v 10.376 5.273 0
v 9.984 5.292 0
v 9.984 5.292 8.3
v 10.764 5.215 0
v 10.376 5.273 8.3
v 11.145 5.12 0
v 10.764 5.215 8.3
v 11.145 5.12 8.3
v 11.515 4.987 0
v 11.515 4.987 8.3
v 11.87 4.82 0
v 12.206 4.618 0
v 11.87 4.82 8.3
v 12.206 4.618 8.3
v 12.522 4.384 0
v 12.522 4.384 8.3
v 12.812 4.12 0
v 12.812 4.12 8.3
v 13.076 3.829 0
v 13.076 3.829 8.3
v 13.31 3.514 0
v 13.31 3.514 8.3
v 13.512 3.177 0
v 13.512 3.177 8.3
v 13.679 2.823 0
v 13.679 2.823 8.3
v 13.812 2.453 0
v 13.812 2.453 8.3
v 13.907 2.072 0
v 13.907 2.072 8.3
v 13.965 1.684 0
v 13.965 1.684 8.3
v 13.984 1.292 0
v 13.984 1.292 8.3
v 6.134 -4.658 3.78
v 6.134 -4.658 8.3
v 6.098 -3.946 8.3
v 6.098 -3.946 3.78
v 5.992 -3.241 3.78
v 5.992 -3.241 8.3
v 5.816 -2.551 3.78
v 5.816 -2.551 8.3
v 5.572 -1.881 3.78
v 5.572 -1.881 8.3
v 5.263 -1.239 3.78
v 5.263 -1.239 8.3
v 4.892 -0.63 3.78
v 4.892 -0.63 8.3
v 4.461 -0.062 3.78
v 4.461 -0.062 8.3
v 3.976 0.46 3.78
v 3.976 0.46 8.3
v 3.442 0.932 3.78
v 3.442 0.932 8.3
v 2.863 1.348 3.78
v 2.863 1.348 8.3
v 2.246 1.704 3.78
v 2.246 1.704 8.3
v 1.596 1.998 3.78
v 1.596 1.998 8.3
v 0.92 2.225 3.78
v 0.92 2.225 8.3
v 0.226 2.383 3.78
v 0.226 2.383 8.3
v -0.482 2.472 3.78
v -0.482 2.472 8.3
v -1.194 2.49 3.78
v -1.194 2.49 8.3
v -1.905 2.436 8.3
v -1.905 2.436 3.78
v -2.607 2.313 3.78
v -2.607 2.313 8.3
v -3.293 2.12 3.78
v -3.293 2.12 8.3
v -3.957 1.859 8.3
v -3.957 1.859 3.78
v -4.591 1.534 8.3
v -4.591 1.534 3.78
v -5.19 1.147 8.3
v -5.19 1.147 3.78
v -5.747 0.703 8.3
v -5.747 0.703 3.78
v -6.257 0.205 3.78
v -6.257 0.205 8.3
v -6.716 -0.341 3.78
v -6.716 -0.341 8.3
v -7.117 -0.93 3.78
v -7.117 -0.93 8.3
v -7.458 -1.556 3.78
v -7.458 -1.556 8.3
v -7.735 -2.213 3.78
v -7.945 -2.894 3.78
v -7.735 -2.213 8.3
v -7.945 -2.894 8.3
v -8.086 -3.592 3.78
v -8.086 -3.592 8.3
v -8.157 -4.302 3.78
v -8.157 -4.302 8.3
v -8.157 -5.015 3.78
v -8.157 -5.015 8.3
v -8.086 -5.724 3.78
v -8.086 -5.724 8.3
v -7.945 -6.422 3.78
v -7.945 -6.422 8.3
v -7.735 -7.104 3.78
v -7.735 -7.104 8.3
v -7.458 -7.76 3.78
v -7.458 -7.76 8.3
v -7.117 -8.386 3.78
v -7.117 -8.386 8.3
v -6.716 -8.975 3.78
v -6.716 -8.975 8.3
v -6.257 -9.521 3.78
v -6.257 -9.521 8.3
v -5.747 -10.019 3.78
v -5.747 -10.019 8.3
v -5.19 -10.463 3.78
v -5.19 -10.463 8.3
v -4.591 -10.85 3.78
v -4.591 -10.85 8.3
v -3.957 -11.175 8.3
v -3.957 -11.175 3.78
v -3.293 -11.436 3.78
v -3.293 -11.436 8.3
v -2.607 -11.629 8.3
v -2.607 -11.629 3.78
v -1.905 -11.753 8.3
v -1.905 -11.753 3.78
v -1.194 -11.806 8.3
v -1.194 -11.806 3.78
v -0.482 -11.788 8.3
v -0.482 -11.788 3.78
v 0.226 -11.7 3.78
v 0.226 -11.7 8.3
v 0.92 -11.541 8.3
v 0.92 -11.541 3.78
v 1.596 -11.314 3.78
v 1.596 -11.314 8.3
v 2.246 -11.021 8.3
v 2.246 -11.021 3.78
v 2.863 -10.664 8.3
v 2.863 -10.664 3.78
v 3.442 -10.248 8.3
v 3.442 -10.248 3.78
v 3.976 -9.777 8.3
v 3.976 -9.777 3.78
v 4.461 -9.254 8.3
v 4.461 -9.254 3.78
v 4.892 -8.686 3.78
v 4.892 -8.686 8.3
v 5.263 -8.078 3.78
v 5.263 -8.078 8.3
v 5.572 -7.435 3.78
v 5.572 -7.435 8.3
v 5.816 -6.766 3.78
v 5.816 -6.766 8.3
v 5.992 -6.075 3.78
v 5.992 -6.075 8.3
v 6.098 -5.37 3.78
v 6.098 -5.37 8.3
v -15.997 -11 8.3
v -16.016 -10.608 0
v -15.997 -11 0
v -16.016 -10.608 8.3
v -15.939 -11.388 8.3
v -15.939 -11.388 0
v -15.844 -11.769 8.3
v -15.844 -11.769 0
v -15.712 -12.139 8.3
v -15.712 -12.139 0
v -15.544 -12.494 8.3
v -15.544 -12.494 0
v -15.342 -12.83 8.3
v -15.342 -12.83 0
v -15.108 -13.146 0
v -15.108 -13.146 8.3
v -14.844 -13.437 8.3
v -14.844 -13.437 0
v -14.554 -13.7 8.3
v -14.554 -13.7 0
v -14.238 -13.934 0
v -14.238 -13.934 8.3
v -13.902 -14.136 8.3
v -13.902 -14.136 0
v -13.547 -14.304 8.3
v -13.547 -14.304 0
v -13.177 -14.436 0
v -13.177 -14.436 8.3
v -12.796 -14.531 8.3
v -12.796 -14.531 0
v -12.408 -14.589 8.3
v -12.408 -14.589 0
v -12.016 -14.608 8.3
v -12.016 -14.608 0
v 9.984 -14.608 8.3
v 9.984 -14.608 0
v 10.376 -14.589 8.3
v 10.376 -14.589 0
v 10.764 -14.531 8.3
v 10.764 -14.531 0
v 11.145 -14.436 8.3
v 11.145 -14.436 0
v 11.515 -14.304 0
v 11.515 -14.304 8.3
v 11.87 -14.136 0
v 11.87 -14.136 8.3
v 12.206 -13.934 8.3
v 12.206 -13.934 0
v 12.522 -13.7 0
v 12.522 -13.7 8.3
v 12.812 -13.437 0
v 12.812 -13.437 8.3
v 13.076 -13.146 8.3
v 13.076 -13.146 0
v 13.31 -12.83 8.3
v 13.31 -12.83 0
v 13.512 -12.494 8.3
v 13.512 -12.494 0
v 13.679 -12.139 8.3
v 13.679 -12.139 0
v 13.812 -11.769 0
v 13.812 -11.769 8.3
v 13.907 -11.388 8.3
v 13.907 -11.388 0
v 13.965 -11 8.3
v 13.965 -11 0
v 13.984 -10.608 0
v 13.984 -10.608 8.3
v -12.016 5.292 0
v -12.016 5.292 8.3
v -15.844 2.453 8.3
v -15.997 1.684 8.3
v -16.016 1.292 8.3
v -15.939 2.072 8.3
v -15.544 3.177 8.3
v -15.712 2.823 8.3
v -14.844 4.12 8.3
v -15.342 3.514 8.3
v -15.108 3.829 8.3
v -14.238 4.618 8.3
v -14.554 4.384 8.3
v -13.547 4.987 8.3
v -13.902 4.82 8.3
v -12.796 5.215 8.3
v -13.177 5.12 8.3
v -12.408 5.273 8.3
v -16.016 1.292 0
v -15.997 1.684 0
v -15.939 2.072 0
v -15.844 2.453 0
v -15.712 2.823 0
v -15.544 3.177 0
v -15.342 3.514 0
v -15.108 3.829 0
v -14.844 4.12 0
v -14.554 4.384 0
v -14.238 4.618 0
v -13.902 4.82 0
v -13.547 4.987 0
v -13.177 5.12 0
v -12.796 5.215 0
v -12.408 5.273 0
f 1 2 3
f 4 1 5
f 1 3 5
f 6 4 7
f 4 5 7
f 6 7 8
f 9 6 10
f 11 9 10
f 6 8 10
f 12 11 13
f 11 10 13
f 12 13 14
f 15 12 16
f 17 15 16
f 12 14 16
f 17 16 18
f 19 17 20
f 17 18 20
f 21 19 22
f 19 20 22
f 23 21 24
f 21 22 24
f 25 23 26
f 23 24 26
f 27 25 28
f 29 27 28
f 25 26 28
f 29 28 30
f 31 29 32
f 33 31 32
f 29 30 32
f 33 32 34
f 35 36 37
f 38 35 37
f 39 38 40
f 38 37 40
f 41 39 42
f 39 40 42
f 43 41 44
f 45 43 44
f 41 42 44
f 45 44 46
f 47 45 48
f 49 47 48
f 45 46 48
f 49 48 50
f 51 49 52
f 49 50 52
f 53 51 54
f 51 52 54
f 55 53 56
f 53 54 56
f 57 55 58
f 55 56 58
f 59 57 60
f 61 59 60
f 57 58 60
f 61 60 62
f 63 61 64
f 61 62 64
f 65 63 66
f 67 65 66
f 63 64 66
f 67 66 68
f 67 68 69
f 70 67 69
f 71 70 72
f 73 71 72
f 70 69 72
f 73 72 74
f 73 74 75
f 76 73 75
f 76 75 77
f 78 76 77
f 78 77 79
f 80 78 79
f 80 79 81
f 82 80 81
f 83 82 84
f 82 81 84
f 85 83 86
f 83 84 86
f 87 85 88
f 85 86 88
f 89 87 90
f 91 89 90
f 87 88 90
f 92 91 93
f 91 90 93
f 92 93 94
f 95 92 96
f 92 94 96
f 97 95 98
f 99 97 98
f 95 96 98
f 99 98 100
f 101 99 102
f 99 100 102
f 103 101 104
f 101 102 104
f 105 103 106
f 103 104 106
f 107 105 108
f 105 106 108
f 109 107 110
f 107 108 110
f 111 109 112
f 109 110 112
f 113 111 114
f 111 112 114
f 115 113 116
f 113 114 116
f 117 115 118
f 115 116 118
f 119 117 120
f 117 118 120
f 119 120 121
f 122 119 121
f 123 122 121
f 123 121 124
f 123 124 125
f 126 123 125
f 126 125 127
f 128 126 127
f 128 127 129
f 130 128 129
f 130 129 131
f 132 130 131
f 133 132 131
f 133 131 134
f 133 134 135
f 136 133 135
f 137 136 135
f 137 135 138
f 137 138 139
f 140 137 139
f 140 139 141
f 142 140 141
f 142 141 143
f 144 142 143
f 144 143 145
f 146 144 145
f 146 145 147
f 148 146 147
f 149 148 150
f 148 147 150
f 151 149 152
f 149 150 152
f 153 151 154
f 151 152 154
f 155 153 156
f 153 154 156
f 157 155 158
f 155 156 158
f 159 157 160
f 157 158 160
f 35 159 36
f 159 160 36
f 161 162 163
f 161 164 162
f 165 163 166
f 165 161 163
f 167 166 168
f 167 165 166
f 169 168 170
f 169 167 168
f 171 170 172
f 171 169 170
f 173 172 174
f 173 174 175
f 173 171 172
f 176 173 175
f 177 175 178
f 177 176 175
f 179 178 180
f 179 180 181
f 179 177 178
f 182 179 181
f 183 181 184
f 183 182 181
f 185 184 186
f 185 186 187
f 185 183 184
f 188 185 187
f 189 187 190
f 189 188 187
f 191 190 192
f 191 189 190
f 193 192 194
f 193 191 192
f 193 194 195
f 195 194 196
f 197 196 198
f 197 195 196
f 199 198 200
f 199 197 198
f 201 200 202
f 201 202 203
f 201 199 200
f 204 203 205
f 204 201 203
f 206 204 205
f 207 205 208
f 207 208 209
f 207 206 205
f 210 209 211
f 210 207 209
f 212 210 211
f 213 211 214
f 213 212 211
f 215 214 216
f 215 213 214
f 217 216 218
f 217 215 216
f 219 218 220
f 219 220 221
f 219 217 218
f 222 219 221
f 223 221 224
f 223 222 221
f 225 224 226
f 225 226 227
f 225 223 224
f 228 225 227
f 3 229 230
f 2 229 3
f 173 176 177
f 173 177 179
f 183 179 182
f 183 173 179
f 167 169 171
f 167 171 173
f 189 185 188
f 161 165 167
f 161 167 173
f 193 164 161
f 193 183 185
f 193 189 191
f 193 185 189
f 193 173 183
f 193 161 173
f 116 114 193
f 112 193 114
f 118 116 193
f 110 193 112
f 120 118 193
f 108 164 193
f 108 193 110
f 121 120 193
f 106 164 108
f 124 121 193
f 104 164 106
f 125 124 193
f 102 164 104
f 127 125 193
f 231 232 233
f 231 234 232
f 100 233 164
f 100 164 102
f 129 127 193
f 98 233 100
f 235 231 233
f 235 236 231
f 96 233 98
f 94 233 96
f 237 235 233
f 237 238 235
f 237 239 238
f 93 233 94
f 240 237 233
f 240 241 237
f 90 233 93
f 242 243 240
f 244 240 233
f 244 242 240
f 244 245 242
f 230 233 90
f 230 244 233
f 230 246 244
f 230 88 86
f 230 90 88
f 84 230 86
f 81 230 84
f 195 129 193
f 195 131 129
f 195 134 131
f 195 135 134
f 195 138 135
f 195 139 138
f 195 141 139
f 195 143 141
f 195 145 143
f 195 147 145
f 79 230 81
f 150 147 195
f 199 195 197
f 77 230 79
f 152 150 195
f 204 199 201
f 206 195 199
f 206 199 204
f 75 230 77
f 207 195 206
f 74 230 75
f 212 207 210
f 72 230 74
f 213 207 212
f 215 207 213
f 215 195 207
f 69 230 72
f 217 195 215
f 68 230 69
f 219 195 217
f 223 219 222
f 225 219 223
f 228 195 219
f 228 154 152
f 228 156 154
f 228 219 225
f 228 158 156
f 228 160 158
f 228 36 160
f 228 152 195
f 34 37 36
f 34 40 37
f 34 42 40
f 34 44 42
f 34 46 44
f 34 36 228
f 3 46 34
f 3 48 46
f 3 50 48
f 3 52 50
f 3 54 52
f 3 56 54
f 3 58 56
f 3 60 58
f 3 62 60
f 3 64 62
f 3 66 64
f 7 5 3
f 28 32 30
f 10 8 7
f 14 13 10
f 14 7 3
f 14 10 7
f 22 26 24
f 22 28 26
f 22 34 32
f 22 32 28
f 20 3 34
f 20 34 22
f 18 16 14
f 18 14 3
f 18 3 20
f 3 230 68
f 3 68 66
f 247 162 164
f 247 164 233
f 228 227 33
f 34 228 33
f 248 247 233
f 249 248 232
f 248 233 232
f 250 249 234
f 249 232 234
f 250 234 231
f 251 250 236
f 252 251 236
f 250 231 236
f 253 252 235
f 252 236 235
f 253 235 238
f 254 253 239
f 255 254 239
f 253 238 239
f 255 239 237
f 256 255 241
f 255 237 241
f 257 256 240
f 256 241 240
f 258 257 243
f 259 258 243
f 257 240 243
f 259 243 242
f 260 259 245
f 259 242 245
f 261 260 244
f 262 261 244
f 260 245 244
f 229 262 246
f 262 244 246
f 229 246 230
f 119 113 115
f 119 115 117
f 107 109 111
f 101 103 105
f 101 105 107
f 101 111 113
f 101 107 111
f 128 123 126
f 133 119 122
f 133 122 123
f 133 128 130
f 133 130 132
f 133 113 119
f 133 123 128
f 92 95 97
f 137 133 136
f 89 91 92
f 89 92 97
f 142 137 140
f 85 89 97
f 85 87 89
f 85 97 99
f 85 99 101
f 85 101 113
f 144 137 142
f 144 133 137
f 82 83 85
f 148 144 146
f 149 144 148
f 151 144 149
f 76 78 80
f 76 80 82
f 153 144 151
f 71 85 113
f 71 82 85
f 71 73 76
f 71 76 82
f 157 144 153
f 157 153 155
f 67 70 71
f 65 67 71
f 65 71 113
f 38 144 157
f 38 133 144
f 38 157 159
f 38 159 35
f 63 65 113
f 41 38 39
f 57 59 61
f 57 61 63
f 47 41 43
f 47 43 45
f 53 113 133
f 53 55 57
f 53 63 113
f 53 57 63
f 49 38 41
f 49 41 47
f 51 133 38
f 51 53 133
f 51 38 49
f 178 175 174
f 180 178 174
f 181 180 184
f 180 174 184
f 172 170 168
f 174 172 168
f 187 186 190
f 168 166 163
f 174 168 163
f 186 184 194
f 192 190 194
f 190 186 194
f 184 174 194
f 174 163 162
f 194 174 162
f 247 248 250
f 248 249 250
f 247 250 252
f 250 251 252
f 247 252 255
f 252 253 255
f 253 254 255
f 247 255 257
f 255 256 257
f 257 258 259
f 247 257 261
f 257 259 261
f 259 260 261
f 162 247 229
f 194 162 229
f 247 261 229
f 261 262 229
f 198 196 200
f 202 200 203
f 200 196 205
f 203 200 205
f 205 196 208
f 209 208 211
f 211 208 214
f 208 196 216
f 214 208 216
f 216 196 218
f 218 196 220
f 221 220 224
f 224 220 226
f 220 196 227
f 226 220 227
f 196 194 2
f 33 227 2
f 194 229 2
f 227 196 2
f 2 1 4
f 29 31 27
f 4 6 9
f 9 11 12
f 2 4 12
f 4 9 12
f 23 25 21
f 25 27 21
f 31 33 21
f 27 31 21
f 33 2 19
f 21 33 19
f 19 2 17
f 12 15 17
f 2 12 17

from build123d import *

# Parameters (mm, degrees)
F0_W     = 30
F0_H     = 19.9
F1_DEPTH = 8.3
F2_R     = 7.15
F3_DEPTH = 4.52
F4_R     = 4


with BuildPart() as f1:
    # F0 (on Top) → F1 (new body)
    with BuildSketch(Plane.XY):
        with Locations((-1.016058, -4.658131)):
            Rectangle(F0_W, F0_H)
    extrude(amount=F1_DEPTH)

    # F2 (on face) → F3 (cut)
    with BuildSketch(Plane.XY.offset(8.3)):
        with Locations((-1.016058, -4.658131)):
            Circle(F2_R)
    extrude(amount=-F3_DEPTH, mode=Mode.SUBTRACT)

    # F4
    f4_edges = [f1.edges().sort_by_distance(p)[0] for p in [
        (13.983942, -14.608131, 4.15),
        (-16.016058, -14.608131, 4.15),
        (13.983942, 5.291869, 4.15),
        (-16.016058, 5.291869, 4.15),
    ]]
    fillet(f4_edges, radius=F4_R)


solid = f1.part
